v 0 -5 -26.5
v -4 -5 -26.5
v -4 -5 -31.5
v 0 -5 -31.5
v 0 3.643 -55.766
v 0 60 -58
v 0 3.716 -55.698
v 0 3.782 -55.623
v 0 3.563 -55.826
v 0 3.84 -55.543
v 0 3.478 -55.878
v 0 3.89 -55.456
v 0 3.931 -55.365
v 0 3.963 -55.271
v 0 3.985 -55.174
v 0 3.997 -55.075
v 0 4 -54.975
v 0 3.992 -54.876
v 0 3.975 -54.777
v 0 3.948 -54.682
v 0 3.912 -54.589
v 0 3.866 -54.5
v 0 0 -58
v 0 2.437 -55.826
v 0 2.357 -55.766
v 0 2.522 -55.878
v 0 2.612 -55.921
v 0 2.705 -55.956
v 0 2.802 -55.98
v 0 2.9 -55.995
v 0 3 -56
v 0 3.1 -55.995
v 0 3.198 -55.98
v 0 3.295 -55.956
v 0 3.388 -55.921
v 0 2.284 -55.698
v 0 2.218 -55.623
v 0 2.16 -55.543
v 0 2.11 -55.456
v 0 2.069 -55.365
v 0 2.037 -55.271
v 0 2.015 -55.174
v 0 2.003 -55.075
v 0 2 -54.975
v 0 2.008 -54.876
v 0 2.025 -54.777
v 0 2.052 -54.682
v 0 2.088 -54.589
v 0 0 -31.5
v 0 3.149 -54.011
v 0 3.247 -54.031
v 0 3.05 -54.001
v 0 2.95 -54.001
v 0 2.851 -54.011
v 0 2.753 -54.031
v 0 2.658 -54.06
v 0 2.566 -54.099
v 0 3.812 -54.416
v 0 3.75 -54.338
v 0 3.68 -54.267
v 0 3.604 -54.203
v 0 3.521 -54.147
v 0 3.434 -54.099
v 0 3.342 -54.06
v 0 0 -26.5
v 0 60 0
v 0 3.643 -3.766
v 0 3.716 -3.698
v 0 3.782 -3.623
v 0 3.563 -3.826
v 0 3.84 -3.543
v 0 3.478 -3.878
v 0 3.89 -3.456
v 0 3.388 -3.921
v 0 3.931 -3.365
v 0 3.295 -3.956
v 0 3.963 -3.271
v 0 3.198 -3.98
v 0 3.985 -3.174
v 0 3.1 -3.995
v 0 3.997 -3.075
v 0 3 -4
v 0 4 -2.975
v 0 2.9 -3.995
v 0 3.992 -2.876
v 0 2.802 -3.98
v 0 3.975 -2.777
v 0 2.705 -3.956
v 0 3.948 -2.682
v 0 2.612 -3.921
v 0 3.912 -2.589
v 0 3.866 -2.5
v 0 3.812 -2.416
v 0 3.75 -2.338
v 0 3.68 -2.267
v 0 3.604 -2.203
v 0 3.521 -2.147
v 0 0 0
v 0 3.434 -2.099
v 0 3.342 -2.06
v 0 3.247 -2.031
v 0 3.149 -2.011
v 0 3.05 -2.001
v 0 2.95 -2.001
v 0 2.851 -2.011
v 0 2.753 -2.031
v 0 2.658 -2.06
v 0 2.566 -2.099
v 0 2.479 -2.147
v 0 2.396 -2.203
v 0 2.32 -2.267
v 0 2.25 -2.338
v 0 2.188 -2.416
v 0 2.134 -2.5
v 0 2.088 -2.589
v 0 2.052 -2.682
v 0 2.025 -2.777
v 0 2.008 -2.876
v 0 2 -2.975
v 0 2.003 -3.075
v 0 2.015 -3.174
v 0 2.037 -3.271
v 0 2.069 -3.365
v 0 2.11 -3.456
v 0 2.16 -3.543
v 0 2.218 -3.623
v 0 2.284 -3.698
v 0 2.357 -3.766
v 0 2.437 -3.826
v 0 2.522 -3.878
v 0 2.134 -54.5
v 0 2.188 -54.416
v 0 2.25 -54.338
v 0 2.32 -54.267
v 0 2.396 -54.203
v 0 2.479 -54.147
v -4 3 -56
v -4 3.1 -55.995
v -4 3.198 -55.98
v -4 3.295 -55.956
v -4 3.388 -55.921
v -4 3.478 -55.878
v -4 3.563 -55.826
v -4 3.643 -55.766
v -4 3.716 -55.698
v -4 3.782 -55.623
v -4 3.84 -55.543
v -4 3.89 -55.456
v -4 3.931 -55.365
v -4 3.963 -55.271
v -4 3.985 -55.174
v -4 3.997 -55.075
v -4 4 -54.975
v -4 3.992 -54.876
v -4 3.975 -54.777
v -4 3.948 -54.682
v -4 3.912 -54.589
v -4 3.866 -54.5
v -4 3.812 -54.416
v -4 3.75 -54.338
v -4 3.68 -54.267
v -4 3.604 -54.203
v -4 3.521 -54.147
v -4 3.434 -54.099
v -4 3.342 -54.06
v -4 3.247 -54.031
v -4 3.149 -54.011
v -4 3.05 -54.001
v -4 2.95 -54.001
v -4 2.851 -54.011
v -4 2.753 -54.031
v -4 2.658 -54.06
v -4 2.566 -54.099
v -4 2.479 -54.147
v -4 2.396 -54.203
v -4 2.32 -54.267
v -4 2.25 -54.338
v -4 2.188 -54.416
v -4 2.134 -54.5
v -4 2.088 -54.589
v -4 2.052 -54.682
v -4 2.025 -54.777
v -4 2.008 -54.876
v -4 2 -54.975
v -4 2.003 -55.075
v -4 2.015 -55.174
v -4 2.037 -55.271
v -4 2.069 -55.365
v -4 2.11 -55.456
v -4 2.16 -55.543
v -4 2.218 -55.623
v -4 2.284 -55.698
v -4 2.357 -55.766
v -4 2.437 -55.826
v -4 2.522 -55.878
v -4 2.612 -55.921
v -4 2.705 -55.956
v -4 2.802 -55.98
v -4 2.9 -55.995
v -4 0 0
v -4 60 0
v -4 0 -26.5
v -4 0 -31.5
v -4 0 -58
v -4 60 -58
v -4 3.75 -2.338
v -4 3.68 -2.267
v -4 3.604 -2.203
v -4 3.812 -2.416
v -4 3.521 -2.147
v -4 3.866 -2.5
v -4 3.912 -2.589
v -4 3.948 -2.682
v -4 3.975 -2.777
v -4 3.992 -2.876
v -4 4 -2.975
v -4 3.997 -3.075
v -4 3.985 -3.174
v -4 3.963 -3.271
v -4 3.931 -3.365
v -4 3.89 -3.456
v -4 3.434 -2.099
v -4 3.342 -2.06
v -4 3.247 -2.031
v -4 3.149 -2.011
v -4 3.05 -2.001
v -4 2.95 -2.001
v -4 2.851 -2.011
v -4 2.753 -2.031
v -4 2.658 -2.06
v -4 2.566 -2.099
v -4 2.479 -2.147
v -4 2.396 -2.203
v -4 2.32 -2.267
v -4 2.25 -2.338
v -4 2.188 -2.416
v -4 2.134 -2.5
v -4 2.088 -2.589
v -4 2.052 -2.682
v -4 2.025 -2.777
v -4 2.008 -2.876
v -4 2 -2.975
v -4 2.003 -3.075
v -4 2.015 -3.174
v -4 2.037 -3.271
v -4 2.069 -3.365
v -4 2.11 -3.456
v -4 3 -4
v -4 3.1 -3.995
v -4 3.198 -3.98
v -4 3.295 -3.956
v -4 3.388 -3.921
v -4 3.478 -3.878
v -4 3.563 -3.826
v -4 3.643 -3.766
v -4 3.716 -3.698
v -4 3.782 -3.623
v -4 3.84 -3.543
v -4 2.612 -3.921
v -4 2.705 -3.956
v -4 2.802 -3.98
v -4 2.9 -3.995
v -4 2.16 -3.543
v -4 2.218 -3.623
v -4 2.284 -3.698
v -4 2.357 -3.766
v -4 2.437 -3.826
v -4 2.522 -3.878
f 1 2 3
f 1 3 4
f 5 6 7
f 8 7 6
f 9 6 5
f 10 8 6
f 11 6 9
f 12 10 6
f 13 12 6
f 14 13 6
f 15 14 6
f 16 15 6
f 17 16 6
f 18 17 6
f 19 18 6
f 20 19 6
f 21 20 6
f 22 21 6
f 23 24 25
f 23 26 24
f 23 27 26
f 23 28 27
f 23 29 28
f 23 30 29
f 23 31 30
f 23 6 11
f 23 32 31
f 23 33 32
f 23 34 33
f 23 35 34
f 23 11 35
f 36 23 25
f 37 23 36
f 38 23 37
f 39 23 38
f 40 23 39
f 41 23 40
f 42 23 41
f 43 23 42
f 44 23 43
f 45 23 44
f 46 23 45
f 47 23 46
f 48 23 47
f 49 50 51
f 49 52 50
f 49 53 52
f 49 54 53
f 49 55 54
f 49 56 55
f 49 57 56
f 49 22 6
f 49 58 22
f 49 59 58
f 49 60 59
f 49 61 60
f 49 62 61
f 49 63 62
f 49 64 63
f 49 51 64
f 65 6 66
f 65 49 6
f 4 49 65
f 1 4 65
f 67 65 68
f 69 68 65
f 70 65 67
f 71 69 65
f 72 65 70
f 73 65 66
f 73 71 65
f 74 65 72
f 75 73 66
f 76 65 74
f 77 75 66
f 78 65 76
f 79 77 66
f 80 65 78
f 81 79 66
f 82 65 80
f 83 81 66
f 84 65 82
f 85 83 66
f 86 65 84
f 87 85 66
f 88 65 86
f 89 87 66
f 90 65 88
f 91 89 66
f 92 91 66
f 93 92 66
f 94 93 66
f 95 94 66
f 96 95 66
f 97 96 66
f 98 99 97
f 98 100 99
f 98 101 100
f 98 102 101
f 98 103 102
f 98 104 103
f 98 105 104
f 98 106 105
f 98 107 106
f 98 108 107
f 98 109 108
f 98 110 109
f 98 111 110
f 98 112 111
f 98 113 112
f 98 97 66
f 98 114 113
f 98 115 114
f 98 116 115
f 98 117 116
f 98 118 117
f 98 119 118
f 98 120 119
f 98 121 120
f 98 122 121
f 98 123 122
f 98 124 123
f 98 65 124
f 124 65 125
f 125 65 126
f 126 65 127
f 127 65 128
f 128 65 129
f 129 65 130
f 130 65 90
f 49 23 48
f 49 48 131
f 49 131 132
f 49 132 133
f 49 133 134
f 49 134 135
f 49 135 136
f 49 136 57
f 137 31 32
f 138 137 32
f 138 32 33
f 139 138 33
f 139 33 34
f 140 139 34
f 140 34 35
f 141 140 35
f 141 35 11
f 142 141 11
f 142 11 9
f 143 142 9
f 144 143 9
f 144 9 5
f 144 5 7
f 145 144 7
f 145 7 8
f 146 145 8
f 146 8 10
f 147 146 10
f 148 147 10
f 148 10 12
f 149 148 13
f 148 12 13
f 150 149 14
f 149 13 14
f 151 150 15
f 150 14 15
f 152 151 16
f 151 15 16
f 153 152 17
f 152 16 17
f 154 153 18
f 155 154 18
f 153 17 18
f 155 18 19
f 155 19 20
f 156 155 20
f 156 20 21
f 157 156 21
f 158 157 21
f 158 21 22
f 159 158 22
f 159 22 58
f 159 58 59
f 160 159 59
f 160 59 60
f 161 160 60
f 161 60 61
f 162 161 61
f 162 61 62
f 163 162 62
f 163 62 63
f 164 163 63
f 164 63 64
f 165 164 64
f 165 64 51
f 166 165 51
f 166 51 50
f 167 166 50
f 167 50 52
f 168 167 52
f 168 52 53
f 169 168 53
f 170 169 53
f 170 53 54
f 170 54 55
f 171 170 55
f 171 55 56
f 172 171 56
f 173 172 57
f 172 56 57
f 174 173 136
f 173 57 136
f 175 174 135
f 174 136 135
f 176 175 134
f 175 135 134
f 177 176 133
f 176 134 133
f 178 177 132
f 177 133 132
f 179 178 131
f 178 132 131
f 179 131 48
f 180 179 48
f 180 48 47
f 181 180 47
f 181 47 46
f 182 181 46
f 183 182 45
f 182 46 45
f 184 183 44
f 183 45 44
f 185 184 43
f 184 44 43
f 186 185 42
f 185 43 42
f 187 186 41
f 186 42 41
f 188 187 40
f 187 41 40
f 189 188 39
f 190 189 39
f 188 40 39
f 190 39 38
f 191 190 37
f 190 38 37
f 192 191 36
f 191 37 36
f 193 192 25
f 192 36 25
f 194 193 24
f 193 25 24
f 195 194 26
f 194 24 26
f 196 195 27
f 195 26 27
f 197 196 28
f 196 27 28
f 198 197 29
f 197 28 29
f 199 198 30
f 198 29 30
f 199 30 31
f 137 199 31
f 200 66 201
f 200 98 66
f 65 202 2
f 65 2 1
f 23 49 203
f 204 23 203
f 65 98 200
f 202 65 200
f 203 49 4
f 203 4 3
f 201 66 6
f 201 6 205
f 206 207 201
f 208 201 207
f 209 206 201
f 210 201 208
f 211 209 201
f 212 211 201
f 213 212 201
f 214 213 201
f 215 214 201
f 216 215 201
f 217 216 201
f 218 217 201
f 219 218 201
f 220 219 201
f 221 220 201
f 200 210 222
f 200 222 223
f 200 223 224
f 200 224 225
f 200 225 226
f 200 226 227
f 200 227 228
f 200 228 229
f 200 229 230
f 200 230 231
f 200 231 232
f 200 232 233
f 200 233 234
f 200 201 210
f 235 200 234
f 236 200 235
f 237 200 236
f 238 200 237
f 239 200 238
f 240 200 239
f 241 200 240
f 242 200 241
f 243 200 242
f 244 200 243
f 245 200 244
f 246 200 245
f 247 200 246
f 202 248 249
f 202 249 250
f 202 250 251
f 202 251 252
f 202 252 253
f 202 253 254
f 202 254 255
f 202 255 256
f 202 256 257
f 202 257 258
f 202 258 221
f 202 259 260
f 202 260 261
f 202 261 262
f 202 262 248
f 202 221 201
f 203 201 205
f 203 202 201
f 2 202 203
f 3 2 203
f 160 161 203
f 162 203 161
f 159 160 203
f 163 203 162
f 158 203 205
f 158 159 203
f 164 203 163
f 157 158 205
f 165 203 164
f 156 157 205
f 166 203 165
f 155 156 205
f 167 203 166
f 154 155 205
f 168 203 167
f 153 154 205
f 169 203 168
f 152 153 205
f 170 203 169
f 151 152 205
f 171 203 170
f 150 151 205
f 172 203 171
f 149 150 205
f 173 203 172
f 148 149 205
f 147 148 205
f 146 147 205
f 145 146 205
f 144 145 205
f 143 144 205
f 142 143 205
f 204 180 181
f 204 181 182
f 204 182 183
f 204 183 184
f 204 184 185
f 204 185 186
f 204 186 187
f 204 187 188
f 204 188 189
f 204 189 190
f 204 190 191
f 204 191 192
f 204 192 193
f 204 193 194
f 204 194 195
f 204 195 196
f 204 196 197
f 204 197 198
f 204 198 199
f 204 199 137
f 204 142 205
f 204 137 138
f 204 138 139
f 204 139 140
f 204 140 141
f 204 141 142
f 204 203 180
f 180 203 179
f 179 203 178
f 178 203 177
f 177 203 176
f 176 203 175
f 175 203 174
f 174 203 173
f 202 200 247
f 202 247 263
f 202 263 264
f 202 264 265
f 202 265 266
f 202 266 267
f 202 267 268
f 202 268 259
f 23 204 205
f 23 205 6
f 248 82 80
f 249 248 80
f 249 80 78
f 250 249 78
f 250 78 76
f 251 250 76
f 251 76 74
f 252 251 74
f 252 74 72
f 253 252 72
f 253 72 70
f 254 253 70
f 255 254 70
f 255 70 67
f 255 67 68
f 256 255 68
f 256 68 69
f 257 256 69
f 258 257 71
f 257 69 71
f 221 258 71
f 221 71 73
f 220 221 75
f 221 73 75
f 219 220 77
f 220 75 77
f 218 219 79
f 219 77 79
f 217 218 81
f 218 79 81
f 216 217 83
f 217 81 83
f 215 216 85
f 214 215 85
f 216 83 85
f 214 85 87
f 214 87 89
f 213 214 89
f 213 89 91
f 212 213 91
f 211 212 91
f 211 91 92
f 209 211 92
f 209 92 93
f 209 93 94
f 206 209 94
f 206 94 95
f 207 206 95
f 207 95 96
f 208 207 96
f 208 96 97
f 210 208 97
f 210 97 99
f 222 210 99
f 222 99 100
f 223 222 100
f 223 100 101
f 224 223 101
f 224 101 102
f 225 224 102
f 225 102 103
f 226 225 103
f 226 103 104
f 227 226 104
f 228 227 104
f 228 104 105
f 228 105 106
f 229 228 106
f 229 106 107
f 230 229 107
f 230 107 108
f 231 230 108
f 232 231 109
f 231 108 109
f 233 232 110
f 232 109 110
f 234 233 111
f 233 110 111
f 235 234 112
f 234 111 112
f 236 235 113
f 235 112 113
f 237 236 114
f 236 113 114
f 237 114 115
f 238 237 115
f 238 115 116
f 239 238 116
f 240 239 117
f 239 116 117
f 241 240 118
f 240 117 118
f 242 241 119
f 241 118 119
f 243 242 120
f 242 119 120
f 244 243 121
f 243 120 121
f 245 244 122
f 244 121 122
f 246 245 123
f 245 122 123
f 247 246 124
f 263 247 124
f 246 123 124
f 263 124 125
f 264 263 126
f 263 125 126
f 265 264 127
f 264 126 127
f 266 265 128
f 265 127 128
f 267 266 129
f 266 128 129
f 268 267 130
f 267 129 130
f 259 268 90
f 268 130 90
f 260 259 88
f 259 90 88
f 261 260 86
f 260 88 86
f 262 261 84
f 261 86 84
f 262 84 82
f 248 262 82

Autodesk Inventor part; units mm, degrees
ref_plane "YZ Plane" through (0, 0, 0) normal (1, 0, 0) x (0, 1, 0)
ref_plane "XZ Plane" through (0, 0, 0) normal (0, 1, 0) x (-1, 0, 0)
ref_plane "XY Plane" through (0, 0, 0) normal (0, 0, 1) x (1, 0, 0)
sketch "Sketch1" plane through (0, 0, 0) normal (0, 1, 0) x (-1, 0, 0)
  line L0 (0, 0) -> (4, 0)
  line L1 (4, 0) -> (4, -58)
  line L2 (4, -58) -> (0, -58)
  line L3 (0, -58) -> (0, 0)
  dimension "d0" = 58
  dimension "d1" = 4
extrude "Extrusion1" add sketch "Sketch1" along normal blind 60
sketch "Sketch2" plane through (-4, 0, 0) normal (0, 0, 1) x (1, 0, 0)
  circle A0 centre (2, 2) radius 1
  line L0 (4, 0) -> (0, 0) projected
  line L1 (4, 0) -> (4, 60) projected
  dimension "d4" = 2
  dimension "d5" = 2
  dimension "d6" = 2
extrude "Extrusion2" [suppressed]
fillet "Fillet1" [suppressed]
sketch "Sketch3" plane through (0, 2, 0) normal (1, 0, 0) x (0, 0, -1)
  line L0 (19, 20.5) -> (24, 20.5)
  line L1 (24, 20.5) -> (24, 35.5)
  line L2 (24, 35.5) -> (19, 35.5)
  line L3 (19, 35.5) -> (19, 20.5)
  line L4 (34, 20.5) -> (39, 20.5)
  line L5 (39, 20.5) -> (39, 35.5)
  line L6 (39, 35.5) -> (34, 35.5)
  line L7 (34, 35.5) -> (34, 20.5)
  line L8 (0, -2) -> (0, 58) projected
  line L9 (58, -2) -> (58, 58) projected
  line L10 (0, -2) -> (58, -2) projected
  line L11 (0, 58) -> (58, 58) projected
  point P0 (0, 0)
  point P1 (0, 56)
  point P2 (58, 0)
  point P3 (58, 56)
  dimension "d10" = 15
  dimension "d11" = 15
  dimension "d12" = 5
  dimension "d13" = 5
  dimension "d14" = 10
  dimension "d15" = 19
  dimension "d16" = 58
  dimension "d17" = 60
  dimension "d18" = 22.5
extrude "Extrusion3" [suppressed]
sketch "Sketch4" plane through (0, 22.5, -19) normal (0, 0, 1) x (1, 0, 0)
  circle A0 centre (5, 7.5) radius 1.5
  line L0 (0, 0) -> (10, 0) projected
  line L1 (10, 0) -> (10, 15) projected
  point P0 (0, -22.5)
  dimension "d21" = 3
  dimension "d22" = 7.5
  dimension "d23" = 5
  dimension "d24" = 15
  dimension "d25" = 10
extrude "Extrusion4" [suppressed]
fillet "Fillet2" [suppressed]
sketch "Esquisse5" plane through (0, 0, 0) normal (1, 0, 0) x (0, 0, -1)
  circle A0 centre (55, 3) radius 1
  circle A1 centre (3, 3) radius 1
  line L0 (0, 0) -> (0, 60) projected
  line L1 (58, 0) -> (0, 0) projected
  line L2 (58, 0) -> (58, 60) projected
  dimension "d29" = 2
  dimension "d30" = 2
  dimension "d31" = 3
  dimension "d32" = 3
  dimension "d33" = 3
  dimension "d34" = 3
extrude "Extrusion5" cut sketch "Esquisse5" against normal blind 10
sketch "Esquisse6" plane through (0, 0, 0) normal (0, -1, 0) x (1, 0, 0)
  line L0 (-4, -58) -> (-4, 0) projected
  line L1 (0, 0) -> (0, -58) projected
  line L2 (-4, -26.5) -> (0, -26.5)
  line L3 (0, -26.5) -> (0, -31.5)
  line L4 (0, -31.5) -> (-4, -31.5)
  line L5 (-4, -31.5) -> (-4, -26.5)
  line L6 (0, 0) -> (-4, 0) projected
  dimension "d37" = 5
  dimension "d38" = 26.5
  dimension "d39" = 58
extrude "Extrusion6" add sketch "Esquisse6" along normal blind 5 contours L0 L2 L1 L4
equation "\"d6\" = d5"
equation "\"d11\" = d10"
equation "\"d13\" = d12"
equation "\"d15\" = 0.5 * d16 - 0.5 * d14 - 0.5 * d12 - 0.5 * d13"
equation "\"d18\" = 0.5 * d17 - 0.5 * d10"
equation "\"d22\" = 0.5 * d24"
equation "\"d23\" = 0.5 * d25"
equation "\"d32\" = d31"
equation "\"d33\" = d32"
equation "\"d34\" = d33"
equation "\"d38\" = 0.5 * d39 - 0.5 * d37"
properties part number "extremite_pince" material "PC/ABS Plastic"
